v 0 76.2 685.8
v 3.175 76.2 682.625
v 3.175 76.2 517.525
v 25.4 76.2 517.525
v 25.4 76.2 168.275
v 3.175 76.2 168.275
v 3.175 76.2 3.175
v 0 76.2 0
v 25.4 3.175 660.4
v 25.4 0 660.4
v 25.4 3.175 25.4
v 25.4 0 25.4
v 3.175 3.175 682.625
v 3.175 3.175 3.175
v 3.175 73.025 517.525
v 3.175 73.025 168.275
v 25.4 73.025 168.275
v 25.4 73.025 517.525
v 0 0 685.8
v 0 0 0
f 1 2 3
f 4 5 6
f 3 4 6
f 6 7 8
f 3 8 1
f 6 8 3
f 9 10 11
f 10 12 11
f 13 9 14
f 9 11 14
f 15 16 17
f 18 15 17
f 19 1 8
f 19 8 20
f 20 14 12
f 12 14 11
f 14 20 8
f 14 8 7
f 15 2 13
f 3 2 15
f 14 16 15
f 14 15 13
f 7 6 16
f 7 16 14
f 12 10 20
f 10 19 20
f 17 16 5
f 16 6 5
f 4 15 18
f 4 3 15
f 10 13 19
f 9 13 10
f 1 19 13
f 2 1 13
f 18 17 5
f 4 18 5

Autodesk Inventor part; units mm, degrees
ref_plane "YZ Plane" through (0, 0, 0) normal (1, 0, 0) x (0, 1, 0)
ref_plane "XZ Plane" through (0, 0, 0) normal (0, 1, 0) x (-1, 0, 0)
ref_plane "XY Plane" through (0, 0, 0) normal (0, 0, 1) x (1, 0, 0)
sketch "Sketch1" plane through (0, 0, 0) normal (0, 0, 1) x (1, 0, 0)
  line L0 (0, 0) -> (25.4, 0)
  line L1 (25.4, 76.2) -> (0, 76.2)
  line L2 (0, 76.2) -> (0, 0)
  line L3 (25.4, 3.175) -> (3.175, 3.175)
  line L4 (3.175, 3.175) -> (3.175, 73.025)
  line L5 (3.175, 73.025) -> (25.4, 73.025)
  line L6 (25.4, 0) -> (25.4, 3.175)
  line L7 (25.4, 73.025) -> (25.4, 76.2)
  dimension "d0" = 76.2
  dimension "d1" = 25.4
  dimension "d2" = 3.175
  dimension "d3" = 3.175
  dimension "d4" = 3.175
extrude "Extrusion1" add sketch "Sketch1" along normal blind 685.8
sketch "Sketch2" plane through (0, 76.2, 0) normal (0, 1, 0) x (1, 0, 0)
  line L0 (0, -685.8) -> (25.4, -685.8) projected
  line L1 (25.4, 0) -> (25.4, -685.8) projected
  line L2 (25.4, 0) -> (0, 0) projected
  line L3 (0, 0) -> (0, -685.8) projected
  line L4 (0, -685.8) -> (25.4, -660.4)
  line L5 (0, 0) -> (25.4, -25.4)
  line L6 (3.175, -682.625) -> (3.175, -517.525)
  line L7 (3.175, -517.525) -> (25.4, -517.525)
  line L8 (3.175, -3.175) -> (3.175, -168.275)
  line L9 (3.175, -168.275) -> (25.4, -168.275)
  dimension "d7" = 45
  dimension "d8" = 3.175
  dimension "d9" = 165.1
  dimension "d10" = 165.1
extrude "Extrusion2" cut sketch "Sketch2" against normal through all contours L4 L1 L0 | L2 L1 L5
extrude "Extrusion3" cut sketch "Sketch2" against normal up to next contours L6 L7 L1 L4 | L5 L1 L9 L8
equation "\"d3\" = d2"
equation "\"d4\" = d2"
equation "\"d10\" = d9"
properties part number "frame U 1 by 3"
